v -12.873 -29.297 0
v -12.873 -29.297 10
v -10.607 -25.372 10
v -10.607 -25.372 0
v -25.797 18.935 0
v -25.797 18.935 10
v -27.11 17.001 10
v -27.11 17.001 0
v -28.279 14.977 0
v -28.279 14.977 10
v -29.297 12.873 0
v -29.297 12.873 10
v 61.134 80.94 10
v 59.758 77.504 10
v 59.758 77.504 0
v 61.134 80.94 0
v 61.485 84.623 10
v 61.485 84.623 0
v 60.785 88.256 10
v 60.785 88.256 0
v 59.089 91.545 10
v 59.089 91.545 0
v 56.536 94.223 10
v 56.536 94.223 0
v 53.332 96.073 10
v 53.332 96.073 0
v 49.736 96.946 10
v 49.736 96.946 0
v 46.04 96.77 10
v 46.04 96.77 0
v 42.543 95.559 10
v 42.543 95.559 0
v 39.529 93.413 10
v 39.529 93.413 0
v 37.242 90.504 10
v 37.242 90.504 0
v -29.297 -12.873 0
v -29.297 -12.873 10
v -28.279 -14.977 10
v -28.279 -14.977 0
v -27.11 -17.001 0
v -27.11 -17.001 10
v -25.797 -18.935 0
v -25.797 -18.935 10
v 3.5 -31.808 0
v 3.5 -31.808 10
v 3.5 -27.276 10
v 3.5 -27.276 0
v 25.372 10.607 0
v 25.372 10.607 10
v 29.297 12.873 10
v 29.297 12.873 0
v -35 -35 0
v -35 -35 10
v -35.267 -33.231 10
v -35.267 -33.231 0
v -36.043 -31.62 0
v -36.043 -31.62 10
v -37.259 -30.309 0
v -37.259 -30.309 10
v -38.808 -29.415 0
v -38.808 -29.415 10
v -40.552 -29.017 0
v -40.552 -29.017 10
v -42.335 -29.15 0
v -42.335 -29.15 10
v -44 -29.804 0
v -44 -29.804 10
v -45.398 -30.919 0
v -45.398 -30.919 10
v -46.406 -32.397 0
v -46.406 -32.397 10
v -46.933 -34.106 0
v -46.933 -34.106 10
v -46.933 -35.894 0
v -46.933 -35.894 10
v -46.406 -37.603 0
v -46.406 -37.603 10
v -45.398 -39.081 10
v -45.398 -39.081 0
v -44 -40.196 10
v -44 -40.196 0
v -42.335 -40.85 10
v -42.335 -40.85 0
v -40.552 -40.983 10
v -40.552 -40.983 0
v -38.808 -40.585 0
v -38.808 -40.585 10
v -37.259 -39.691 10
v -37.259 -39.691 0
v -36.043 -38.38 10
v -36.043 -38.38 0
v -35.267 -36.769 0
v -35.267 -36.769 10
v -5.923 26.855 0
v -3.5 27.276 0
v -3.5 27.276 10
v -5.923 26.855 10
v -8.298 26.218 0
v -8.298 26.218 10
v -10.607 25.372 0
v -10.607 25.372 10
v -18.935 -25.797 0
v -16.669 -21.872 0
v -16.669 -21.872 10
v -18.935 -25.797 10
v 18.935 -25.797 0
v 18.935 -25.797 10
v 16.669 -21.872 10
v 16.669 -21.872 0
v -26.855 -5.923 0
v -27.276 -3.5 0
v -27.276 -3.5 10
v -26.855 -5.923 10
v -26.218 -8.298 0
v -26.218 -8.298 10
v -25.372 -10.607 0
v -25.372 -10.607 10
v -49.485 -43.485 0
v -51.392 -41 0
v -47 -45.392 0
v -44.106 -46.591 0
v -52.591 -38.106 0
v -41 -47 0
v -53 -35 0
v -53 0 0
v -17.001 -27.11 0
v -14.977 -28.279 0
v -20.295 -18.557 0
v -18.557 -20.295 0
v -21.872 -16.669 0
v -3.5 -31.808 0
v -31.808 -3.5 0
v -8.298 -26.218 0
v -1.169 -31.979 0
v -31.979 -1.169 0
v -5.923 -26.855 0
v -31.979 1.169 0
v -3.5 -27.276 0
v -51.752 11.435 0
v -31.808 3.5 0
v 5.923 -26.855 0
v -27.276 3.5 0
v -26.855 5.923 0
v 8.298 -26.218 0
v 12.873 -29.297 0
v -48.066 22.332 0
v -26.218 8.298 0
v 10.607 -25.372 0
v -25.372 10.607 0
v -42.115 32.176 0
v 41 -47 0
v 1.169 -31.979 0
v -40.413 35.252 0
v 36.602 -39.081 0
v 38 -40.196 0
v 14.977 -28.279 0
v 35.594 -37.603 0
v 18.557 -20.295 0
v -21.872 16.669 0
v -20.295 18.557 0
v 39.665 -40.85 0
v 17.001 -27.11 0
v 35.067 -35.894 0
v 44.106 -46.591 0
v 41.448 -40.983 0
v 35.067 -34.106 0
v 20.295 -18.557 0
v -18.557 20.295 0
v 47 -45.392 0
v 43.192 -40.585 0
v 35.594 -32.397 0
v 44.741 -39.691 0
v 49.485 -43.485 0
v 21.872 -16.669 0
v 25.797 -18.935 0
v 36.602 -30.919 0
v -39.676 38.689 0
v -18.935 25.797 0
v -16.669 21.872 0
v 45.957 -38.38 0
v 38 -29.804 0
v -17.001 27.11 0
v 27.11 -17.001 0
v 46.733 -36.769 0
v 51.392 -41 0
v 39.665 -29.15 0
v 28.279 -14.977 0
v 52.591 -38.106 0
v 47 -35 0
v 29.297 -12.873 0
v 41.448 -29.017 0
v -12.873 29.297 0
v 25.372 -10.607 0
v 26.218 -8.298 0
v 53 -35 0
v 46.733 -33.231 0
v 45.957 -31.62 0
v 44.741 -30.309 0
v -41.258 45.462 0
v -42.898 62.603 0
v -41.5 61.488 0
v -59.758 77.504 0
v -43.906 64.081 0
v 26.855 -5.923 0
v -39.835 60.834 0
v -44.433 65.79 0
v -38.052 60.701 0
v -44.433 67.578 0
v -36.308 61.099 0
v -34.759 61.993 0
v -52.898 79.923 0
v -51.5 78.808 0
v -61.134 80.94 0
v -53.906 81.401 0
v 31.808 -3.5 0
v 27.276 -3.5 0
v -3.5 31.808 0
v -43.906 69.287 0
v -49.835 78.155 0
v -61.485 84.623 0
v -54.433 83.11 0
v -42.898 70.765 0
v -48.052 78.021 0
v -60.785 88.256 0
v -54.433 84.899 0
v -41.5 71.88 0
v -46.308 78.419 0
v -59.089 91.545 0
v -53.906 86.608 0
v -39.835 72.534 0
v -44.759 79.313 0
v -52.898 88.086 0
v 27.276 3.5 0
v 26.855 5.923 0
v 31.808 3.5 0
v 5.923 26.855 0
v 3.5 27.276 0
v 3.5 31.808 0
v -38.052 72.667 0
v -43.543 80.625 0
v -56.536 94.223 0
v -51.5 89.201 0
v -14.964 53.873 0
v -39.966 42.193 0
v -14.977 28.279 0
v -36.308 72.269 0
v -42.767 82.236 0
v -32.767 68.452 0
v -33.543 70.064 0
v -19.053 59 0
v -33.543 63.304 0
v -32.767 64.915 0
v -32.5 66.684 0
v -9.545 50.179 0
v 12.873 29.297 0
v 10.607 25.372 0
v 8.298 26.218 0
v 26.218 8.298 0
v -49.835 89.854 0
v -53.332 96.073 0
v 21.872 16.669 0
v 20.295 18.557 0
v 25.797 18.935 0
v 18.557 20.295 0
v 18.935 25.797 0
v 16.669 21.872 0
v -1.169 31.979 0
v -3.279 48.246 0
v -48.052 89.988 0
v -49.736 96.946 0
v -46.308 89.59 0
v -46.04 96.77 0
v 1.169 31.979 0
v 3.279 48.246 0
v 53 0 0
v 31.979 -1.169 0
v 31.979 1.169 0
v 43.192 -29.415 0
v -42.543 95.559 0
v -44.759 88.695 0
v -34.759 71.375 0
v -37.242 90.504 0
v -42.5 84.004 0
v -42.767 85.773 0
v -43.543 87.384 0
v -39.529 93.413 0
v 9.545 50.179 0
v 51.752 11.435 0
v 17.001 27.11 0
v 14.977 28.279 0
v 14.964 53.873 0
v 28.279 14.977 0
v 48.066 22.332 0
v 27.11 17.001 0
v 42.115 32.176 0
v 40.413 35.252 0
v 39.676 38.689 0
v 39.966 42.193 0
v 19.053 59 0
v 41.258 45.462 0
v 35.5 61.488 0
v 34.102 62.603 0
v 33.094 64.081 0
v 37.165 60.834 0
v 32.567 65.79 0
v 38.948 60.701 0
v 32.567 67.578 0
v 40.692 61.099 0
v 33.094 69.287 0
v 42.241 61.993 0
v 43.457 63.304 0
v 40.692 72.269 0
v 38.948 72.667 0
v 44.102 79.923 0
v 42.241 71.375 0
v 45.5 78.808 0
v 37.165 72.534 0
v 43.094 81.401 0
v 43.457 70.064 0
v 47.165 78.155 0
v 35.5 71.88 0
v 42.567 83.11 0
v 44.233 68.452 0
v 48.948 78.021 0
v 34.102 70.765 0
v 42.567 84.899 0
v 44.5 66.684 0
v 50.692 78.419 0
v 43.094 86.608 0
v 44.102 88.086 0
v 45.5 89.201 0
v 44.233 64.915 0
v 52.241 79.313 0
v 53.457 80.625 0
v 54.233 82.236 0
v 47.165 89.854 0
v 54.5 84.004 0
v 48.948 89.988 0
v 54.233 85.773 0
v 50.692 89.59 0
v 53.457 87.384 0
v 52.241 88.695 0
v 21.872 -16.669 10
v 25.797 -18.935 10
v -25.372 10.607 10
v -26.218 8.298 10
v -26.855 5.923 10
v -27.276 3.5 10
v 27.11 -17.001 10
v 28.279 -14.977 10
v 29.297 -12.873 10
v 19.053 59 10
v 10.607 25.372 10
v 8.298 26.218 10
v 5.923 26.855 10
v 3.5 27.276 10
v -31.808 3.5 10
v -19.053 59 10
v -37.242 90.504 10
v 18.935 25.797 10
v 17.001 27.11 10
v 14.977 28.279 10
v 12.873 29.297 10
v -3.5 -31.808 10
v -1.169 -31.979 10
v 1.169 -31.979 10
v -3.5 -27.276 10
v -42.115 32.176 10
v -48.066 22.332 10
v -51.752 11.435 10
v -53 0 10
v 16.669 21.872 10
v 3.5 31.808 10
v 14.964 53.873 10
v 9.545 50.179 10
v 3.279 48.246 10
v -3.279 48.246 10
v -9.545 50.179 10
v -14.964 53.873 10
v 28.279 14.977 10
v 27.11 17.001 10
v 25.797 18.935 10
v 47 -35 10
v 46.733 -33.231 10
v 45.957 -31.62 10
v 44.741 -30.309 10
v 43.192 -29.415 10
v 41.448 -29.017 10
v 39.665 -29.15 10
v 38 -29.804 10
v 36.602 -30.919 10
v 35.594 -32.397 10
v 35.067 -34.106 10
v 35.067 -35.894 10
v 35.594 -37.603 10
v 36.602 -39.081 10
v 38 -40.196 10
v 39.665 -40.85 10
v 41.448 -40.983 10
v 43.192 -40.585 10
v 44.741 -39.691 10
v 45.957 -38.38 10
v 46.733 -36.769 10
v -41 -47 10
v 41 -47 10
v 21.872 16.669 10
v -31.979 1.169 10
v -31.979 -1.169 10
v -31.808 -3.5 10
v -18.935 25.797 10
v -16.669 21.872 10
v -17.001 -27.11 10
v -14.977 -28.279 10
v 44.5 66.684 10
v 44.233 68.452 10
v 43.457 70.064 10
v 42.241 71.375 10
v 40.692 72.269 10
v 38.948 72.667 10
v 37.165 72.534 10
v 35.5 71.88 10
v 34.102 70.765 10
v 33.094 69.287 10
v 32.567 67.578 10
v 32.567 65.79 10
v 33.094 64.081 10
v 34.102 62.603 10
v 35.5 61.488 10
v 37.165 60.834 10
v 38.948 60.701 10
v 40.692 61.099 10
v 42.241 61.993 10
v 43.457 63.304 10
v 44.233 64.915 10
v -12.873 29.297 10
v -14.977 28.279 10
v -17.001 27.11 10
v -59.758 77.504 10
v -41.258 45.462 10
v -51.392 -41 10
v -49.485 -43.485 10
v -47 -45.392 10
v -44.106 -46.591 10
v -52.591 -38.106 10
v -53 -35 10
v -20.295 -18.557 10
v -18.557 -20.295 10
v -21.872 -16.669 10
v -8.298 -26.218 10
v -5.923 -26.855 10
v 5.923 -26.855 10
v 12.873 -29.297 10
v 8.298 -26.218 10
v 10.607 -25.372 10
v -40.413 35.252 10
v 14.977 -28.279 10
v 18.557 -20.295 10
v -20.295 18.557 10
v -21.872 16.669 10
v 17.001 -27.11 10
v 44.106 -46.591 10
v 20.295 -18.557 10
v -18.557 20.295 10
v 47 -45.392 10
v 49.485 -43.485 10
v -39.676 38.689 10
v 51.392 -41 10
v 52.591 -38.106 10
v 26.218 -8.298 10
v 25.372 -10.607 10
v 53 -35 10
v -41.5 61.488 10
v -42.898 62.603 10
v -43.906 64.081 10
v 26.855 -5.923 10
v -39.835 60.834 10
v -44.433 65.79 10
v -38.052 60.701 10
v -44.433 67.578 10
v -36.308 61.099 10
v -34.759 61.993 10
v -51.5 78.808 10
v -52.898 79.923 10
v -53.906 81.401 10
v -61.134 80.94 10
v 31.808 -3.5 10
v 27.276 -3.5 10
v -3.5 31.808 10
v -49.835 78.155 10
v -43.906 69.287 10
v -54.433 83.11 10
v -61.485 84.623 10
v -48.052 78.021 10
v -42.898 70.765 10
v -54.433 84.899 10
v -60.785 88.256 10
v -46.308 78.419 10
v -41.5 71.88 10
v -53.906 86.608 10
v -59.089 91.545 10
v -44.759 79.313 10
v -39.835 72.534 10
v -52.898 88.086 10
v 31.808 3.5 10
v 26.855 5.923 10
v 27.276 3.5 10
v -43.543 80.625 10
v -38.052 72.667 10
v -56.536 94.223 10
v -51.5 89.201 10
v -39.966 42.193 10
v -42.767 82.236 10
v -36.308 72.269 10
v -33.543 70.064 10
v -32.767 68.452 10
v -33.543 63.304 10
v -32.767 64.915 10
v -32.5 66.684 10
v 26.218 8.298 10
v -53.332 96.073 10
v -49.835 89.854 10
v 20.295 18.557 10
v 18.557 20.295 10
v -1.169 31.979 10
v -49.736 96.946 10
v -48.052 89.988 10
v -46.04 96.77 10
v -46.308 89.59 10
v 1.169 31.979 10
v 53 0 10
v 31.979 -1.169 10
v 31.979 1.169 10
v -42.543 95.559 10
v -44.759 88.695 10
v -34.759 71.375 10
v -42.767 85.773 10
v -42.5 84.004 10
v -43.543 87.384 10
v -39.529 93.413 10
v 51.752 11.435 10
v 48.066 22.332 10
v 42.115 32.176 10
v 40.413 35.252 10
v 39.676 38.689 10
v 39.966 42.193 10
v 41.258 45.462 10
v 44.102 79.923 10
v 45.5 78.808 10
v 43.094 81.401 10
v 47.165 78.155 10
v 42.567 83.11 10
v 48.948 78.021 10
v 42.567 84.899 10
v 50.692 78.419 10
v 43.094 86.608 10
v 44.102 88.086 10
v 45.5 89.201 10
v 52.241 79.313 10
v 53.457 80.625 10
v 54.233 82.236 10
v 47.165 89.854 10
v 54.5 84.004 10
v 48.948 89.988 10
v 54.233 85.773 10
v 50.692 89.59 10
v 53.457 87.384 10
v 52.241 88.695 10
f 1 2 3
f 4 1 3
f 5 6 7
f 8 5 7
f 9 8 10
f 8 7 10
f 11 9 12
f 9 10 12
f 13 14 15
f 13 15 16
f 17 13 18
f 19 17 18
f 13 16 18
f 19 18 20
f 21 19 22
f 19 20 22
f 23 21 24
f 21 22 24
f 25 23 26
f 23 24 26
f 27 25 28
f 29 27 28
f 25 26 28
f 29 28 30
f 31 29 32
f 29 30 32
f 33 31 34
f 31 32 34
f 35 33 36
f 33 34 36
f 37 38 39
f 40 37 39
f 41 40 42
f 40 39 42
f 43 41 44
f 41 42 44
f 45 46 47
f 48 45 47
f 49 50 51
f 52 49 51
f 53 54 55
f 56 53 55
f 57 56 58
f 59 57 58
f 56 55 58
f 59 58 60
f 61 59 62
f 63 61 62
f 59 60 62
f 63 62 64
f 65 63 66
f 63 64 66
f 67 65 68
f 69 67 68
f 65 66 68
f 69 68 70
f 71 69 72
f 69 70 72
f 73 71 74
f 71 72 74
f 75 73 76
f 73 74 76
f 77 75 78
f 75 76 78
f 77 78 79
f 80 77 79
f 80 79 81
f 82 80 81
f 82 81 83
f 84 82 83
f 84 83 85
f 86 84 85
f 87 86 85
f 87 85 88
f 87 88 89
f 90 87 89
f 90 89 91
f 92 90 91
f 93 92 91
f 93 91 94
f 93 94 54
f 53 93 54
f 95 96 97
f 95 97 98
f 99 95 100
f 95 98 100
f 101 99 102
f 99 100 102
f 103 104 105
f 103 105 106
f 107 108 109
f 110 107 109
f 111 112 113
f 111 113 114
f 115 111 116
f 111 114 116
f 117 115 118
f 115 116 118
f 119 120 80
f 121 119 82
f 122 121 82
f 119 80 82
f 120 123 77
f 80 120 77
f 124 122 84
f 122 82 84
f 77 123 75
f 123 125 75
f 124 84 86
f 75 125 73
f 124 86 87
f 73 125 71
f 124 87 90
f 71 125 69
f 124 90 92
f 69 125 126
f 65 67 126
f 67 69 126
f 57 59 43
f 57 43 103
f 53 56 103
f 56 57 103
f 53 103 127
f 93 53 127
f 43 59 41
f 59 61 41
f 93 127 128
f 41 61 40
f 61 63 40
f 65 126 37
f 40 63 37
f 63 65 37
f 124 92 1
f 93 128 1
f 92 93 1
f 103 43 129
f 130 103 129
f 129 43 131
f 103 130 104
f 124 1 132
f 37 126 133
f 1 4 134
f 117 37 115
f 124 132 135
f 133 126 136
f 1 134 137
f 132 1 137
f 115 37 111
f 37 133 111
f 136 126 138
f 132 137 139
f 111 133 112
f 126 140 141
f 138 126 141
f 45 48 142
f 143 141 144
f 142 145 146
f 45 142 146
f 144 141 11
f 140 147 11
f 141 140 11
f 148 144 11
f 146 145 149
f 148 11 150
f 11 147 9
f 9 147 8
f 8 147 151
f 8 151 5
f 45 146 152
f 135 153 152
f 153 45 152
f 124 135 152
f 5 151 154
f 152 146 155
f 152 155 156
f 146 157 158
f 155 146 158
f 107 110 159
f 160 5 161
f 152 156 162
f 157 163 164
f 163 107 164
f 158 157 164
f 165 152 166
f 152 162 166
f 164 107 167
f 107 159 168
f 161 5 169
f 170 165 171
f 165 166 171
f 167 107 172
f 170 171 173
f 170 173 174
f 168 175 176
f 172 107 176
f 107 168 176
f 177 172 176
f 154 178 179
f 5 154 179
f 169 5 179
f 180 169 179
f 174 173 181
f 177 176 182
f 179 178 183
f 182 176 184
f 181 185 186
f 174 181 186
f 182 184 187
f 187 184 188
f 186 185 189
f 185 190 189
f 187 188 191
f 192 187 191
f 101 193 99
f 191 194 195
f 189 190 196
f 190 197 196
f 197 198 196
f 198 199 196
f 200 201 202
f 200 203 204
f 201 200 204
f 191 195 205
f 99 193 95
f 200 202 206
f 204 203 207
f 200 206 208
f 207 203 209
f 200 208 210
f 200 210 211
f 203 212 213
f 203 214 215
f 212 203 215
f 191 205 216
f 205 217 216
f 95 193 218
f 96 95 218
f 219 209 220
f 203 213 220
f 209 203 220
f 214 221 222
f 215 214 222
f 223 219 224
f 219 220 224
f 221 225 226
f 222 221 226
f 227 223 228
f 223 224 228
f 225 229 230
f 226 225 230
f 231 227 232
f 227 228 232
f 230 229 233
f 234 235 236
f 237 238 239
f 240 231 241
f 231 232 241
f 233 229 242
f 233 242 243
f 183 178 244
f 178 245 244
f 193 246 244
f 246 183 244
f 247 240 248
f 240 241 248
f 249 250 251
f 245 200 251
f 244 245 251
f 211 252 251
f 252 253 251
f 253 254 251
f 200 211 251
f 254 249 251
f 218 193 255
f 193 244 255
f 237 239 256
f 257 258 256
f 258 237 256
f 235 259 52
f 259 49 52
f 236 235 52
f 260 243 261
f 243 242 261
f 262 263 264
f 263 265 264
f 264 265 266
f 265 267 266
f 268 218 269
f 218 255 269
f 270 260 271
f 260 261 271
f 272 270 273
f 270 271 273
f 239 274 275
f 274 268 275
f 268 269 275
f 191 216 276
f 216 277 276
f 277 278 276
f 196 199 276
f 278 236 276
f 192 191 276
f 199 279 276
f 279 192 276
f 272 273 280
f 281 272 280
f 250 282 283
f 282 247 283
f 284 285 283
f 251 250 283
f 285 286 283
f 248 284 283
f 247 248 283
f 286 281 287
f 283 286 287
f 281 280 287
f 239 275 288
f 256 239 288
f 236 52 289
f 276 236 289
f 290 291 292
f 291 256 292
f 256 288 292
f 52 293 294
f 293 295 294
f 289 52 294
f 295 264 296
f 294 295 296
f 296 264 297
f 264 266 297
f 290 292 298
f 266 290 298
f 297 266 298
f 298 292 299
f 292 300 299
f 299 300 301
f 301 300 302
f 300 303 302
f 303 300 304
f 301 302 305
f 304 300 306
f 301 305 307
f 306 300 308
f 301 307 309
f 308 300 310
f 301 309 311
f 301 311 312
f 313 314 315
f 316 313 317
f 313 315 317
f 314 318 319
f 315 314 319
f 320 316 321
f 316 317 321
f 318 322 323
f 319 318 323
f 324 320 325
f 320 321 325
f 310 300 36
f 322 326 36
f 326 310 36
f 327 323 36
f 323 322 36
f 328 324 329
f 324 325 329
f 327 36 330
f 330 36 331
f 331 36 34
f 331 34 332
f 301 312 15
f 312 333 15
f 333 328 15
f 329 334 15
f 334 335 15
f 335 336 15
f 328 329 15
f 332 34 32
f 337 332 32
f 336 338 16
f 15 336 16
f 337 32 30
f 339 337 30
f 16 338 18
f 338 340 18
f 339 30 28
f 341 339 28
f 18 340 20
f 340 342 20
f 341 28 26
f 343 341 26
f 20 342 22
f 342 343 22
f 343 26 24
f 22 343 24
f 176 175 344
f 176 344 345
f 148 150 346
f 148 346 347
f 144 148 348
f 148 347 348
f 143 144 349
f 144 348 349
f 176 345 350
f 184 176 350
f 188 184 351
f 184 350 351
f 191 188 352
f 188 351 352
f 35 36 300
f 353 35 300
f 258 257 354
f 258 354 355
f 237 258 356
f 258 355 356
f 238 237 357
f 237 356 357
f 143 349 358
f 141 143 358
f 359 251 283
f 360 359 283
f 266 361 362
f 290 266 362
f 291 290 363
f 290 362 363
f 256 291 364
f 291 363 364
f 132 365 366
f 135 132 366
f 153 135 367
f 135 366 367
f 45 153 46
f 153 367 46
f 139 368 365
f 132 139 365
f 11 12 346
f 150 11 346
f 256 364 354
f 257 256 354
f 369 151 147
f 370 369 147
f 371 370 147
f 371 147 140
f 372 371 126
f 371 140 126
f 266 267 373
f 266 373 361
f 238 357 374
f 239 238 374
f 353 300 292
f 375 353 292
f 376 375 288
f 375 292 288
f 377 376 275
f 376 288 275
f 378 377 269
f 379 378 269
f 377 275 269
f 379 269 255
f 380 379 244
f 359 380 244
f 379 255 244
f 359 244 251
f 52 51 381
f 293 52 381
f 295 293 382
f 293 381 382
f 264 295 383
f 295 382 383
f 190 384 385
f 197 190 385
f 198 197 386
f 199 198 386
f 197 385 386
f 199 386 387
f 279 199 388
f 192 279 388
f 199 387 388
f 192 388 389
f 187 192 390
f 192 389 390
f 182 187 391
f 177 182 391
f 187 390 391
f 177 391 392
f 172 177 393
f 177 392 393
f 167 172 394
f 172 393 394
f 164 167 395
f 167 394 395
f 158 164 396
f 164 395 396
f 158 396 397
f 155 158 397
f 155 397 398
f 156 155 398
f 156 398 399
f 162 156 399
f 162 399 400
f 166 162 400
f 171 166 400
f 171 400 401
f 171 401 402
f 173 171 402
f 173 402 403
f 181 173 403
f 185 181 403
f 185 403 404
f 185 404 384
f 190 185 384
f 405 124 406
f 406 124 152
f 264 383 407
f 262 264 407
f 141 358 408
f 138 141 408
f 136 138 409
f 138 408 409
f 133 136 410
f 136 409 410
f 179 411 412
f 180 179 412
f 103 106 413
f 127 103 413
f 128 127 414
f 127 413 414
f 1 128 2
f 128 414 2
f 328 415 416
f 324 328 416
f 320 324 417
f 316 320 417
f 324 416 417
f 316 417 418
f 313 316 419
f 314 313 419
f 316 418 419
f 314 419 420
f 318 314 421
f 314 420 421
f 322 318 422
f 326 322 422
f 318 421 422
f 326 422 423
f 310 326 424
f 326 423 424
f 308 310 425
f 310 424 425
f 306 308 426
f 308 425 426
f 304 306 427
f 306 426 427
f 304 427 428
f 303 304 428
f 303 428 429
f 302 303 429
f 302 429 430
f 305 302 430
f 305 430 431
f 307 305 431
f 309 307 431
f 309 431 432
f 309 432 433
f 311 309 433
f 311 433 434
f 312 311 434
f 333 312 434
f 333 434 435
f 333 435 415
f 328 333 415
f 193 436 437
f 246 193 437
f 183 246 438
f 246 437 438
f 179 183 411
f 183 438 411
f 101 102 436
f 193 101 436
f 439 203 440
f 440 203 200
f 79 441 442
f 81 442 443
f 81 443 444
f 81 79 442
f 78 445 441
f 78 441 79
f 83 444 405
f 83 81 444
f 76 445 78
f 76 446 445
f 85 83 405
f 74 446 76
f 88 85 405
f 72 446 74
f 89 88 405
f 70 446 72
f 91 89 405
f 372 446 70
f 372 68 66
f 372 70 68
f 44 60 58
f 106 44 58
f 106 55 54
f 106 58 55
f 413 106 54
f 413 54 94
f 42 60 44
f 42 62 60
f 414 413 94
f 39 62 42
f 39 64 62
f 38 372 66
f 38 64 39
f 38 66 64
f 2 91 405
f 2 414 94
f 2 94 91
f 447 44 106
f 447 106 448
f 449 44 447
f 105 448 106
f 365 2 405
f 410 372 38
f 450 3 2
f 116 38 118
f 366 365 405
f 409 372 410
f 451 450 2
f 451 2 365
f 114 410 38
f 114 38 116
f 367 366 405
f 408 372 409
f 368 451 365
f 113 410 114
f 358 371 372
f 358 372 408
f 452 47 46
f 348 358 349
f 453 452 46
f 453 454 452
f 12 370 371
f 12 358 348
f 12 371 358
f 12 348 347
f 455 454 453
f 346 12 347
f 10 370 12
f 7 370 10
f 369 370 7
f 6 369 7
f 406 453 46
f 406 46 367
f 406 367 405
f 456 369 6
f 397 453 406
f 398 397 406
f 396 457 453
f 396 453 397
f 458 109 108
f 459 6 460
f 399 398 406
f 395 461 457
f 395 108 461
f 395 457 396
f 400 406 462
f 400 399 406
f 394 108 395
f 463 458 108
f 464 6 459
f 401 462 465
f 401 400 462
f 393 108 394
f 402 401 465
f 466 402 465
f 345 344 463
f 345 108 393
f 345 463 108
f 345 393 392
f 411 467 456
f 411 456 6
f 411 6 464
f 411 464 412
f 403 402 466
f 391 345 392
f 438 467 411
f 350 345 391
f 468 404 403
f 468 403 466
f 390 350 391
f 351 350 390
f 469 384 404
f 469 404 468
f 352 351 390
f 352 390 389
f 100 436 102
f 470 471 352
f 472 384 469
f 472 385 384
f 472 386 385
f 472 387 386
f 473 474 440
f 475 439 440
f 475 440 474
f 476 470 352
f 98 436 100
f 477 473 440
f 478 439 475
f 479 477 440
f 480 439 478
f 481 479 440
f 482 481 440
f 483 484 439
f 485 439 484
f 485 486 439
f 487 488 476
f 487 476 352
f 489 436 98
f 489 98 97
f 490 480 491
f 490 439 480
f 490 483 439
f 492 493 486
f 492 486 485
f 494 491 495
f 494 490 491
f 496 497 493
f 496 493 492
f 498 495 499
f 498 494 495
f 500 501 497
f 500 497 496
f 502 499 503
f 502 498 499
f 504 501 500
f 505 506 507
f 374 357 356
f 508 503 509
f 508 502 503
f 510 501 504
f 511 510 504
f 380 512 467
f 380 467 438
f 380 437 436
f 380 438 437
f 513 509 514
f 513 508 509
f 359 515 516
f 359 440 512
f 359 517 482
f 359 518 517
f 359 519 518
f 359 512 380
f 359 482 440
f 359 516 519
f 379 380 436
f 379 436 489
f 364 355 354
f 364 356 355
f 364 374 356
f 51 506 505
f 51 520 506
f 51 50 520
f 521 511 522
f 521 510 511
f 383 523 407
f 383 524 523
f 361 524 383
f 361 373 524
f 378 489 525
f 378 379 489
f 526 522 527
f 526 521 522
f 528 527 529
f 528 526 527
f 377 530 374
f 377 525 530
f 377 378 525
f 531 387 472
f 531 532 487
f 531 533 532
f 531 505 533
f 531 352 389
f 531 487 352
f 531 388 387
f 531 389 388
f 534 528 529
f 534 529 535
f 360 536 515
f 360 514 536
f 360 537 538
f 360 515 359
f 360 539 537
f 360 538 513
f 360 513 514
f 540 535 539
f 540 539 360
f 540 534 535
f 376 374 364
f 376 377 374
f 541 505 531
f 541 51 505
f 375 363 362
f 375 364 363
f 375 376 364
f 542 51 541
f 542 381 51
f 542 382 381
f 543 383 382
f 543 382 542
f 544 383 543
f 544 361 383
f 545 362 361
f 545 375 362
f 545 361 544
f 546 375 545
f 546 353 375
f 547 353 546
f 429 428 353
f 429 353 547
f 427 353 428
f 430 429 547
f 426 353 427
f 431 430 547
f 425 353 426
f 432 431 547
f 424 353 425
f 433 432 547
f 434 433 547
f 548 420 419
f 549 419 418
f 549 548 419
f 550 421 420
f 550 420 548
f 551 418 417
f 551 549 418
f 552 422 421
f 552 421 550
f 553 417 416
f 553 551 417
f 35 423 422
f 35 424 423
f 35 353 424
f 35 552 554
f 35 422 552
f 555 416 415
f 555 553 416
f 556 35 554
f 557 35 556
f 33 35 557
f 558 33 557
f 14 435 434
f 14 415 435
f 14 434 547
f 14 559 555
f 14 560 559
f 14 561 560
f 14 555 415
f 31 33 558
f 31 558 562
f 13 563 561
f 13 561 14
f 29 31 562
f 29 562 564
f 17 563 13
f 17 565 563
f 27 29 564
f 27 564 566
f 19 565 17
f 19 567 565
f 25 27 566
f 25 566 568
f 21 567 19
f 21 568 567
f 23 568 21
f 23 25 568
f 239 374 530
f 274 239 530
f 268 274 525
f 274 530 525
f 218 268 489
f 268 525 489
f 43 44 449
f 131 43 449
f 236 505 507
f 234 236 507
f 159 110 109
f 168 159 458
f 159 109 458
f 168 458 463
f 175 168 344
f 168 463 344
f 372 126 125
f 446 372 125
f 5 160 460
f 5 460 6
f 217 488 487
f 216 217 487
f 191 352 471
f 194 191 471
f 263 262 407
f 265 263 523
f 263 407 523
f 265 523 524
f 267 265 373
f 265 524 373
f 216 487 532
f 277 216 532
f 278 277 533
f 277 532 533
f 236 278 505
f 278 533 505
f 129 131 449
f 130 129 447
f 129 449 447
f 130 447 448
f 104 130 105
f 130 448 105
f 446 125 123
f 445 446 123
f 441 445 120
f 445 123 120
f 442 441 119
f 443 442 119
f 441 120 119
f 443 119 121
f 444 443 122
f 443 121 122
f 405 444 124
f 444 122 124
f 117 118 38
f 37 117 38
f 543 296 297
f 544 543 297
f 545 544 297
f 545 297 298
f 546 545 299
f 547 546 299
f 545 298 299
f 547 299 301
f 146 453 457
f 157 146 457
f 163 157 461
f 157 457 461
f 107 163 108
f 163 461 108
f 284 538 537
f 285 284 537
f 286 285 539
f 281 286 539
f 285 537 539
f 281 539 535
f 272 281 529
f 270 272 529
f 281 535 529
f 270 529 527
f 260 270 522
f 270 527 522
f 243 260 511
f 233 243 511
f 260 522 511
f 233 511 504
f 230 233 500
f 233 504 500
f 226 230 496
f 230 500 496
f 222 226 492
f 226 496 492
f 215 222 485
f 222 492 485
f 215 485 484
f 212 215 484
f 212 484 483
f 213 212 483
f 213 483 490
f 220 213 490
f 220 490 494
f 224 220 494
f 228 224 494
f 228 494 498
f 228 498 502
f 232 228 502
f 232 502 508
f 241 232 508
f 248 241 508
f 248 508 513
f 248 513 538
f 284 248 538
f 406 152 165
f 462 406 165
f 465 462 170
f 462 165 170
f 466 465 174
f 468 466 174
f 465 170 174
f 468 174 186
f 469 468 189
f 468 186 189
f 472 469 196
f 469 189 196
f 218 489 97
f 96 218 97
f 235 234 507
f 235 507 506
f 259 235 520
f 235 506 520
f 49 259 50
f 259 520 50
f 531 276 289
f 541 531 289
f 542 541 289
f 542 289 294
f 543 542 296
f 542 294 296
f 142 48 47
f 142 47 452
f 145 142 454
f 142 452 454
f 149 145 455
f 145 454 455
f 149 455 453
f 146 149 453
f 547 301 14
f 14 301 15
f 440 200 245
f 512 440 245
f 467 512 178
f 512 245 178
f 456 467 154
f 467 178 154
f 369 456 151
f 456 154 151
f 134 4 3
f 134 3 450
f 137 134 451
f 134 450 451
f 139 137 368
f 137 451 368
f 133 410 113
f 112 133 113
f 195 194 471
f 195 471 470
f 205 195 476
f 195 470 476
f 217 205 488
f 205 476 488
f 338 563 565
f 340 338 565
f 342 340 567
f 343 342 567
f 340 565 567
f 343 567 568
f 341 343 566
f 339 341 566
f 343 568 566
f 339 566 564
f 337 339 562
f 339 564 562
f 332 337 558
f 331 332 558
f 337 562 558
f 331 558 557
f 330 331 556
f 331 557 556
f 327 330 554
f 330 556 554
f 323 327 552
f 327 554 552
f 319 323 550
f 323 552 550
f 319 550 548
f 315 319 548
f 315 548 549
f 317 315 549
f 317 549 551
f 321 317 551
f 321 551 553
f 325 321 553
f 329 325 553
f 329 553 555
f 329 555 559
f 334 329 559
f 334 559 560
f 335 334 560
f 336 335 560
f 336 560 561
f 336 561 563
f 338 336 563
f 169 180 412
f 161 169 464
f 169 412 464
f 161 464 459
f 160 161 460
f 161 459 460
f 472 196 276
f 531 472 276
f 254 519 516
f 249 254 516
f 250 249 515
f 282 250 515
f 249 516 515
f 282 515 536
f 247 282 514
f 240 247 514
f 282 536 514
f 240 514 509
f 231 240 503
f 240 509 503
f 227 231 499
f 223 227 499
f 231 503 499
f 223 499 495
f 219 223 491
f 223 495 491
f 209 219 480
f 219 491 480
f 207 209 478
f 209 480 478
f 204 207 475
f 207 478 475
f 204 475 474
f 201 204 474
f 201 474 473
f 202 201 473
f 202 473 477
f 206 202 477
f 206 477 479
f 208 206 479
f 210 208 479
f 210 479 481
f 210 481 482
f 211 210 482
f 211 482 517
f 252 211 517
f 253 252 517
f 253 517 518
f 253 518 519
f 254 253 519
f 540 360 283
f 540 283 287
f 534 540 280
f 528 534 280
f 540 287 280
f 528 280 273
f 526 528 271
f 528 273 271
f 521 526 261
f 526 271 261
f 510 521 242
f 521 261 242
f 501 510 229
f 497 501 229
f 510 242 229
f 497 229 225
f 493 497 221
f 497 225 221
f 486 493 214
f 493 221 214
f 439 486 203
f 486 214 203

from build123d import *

# Parameters (mm, degrees)
SALIENTE_EXTRUIR1_DEPTH = 10
CROQUIS2_R              = 6
CORTAR_EXTRUIR3_DEPTH   = 116.291439701


with BuildPart() as part:
    # Croquis1 → Saliente-Extruir1 (new body)
    with BuildSketch(Plane.XY):
        with BuildLine():
            Line((-59.758330249, 77.504464167), (-41.258330249, 45.461524227))
            ThreePointArc((-41.258330249, 45.461524227), (-39.675513612, 38.689212456), (-42.115133231, 32.176319754))
            ThreePointArc((-42.115133231, 32.176319754), (-50.205089688, 16.983785484), (-53, 0))
            Line((-53, 0), (-53, -35))
            ThreePointArc((-53, -35), (-49.485281374, -43.485281374), (-41, -47))
            Line((-41, -47), (41, -47))
            ThreePointArc((41, -47), (49.485281374, -43.485281374), (53, -35))
            Line((53, -35), (53, 0))
            ThreePointArc((53, 0), (50.205089688, 16.983785484), (42.115133231, 32.176319754))
            ThreePointArc((42.115133231, 32.176319754), (39.675513612, 38.689212456), (41.258330249, 45.461524227))
            Line((41.258330249, 45.461524227), (59.758330249, 77.504464167))
            ThreePointArc((59.758330249, 77.504464167), (55, 95.262794416), (37.241669751, 90.504464167))
            Line((37.241669751, 90.504464167), (19.052558883, 59))
            ThreePointArc((19.052558883, 59), (0, 48), (-19.052558883, 59))
            Line((-19.052558883, 59), (-37.241669751, 90.504464167))
            ThreePointArc((-37.241669751, 90.504464167), (-55, 95.262794416), (-59.758330249, 77.504464167))
        make_face()
    extrude(amount=SALIENTE_EXTRUIR1_DEPTH)

    # Croquis2 → Cortar-Extruir3 (cut, through all)
    with BuildSketch(Plane.XY.offset(10)):
        with Locations((-41, -35)):
            Circle(CROQUIS2_R)
        with Locations((41, -35)):
            Circle(CROQUIS2_R)
        with Locations((-48.5, 84.004464167)):
            Circle(CROQUIS2_R)
        with Locations((48.5, 84.004464167)):
            Circle(CROQUIS2_R)
        with Locations((-38.5, 66.683956091)):
            Circle(CROQUIS2_R)
        with Locations((38.5, 66.683956091)):
            Circle(CROQUIS2_R)
        with BuildLine():
            Line((-3.5, 31.808017857), (-3.5, 27.276363394))
            ThreePointArc((-3.5, 27.276363394), (-7.11752374, 26.562960223), (-10.607092784, 25.372023622))
            Line((-10.607092784, 25.372023622), (-12.872920015, 29.296551508))
            ThreePointArc((-12.872920015, 29.296551508), (-16, 27.712812921), (-18.935097842, 25.796551508))
            Line((-18.935097842, 25.796551508), (-16.66927061, 21.872023622))
            ThreePointArc((-16.66927061, 21.872023622), (-19.445436483, 19.445436483), (-21.872023622, 16.66927061))
            Line((-21.872023622, 16.66927061), (-25.796551508, 18.935097842))
            ThreePointArc((-25.796551508, 18.935097842), (-27.712812921, 16), (-29.296551508, 12.872920015))
            Line((-29.296551508, 12.872920015), (-25.372023622, 10.607092784))
            ThreePointArc((-25.372023622, 10.607092784), (-26.562960223, 7.11752374), (-27.276363394, 3.5))
            Line((-27.276363394, 3.5), (-31.808017857, 3.5))
            ThreePointArc((-31.808017857, 3.5), (-32, 0), (-31.808017857, -3.5))
            Line((-31.808017857, -3.5), (-27.276363394, -3.5))
            ThreePointArc((-27.276363394, -3.5), (-26.562960223, -7.11752374), (-25.372023622, -10.607092784))
            Line((-25.372023622, -10.607092784), (-29.296551508, -12.872920015))
            ThreePointArc((-29.296551508, -12.872920015), (-27.712812921, -16), (-25.796551508, -18.935097842))
            Line((-25.796551508, -18.935097842), (-21.872023622, -16.66927061))
            ThreePointArc((-21.872023622, -16.66927061), (-19.445436483, -19.445436483), (-16.66927061, -21.872023622))
            Line((-16.66927061, -21.872023622), (-18.935097842, -25.796551508))
            ThreePointArc((-18.935097842, -25.796551508), (-16, -27.712812921), (-12.872920015, -29.296551508))
            Line((-12.872920015, -29.296551508), (-10.607092784, -25.372023622))
            ThreePointArc((-10.607092784, -25.372023622), (-7.11752374, -26.562960223), (-3.5, -27.276363394))
            Line((-3.5, -27.276363394), (-3.5, -31.808017857))
            ThreePointArc((-3.5, -31.808017857), (0, -32), (3.5, -31.808017857))
            Line((3.5, -31.808017857), (3.5, -27.276363394))
            ThreePointArc((3.5, -27.276363394), (7.11752374, -26.562960223), (10.607092784, -25.372023622))
            Line((10.607092784, -25.372023622), (12.872920015, -29.296551508))
            ThreePointArc((12.872920015, -29.296551508), (16, -27.712812921), (18.935097842, -25.796551508))
            Line((18.935097842, -25.796551508), (16.66927061, -21.872023622))
            ThreePointArc((16.66927061, -21.872023622), (19.445436483, -19.445436483), (21.872023622, -16.66927061))
            Line((21.872023622, -16.66927061), (25.796551508, -18.935097842))
            ThreePointArc((25.796551508, -18.935097842), (27.712812921, -16), (29.296551508, -12.872920015))
            Line((29.296551508, -12.872920015), (25.372023622, -10.607092784))
            ThreePointArc((25.372023622, -10.607092784), (26.562960223, -7.11752374), (27.276363394, -3.5))
            Line((27.276363394, -3.5), (31.808017857, -3.5))
            ThreePointArc((31.808017857, -3.5), (32, 0), (31.808017857, 3.5))
            Line((31.808017857, 3.5), (27.276363394, 3.5))
            ThreePointArc((27.276363394, 3.5), (26.562960223, 7.11752374), (25.372023622, 10.607092784))
            Line((25.372023622, 10.607092784), (29.296551508, 12.872920015))
            ThreePointArc((29.296551508, 12.872920015), (27.712812921, 16), (25.796551508, 18.935097842))
            Line((25.796551508, 18.935097842), (21.872023622, 16.66927061))
            ThreePointArc((21.872023622, 16.66927061), (19.445436483, 19.445436483), (16.66927061, 21.872023622))
            Line((16.66927061, 21.872023622), (18.935097842, 25.796551508))
            ThreePointArc((18.935097842, 25.796551508), (16, 27.712812921), (12.872920015, 29.296551508))
            Line((12.872920015, 29.296551508), (10.607092784, 25.372023622))
            ThreePointArc((10.607092784, 25.372023622), (7.11752374, 26.562960223), (3.5, 27.276363394))
            Line((3.5, 27.276363394), (3.5, 31.808017857))
            ThreePointArc((3.5, 31.808017857), (0, 32), (-3.5, 31.808017857))
        make_face()
    extrude(amount=-CORTAR_EXTRUIR3_DEPTH, mode=Mode.SUBTRACT)


solid = part.part
